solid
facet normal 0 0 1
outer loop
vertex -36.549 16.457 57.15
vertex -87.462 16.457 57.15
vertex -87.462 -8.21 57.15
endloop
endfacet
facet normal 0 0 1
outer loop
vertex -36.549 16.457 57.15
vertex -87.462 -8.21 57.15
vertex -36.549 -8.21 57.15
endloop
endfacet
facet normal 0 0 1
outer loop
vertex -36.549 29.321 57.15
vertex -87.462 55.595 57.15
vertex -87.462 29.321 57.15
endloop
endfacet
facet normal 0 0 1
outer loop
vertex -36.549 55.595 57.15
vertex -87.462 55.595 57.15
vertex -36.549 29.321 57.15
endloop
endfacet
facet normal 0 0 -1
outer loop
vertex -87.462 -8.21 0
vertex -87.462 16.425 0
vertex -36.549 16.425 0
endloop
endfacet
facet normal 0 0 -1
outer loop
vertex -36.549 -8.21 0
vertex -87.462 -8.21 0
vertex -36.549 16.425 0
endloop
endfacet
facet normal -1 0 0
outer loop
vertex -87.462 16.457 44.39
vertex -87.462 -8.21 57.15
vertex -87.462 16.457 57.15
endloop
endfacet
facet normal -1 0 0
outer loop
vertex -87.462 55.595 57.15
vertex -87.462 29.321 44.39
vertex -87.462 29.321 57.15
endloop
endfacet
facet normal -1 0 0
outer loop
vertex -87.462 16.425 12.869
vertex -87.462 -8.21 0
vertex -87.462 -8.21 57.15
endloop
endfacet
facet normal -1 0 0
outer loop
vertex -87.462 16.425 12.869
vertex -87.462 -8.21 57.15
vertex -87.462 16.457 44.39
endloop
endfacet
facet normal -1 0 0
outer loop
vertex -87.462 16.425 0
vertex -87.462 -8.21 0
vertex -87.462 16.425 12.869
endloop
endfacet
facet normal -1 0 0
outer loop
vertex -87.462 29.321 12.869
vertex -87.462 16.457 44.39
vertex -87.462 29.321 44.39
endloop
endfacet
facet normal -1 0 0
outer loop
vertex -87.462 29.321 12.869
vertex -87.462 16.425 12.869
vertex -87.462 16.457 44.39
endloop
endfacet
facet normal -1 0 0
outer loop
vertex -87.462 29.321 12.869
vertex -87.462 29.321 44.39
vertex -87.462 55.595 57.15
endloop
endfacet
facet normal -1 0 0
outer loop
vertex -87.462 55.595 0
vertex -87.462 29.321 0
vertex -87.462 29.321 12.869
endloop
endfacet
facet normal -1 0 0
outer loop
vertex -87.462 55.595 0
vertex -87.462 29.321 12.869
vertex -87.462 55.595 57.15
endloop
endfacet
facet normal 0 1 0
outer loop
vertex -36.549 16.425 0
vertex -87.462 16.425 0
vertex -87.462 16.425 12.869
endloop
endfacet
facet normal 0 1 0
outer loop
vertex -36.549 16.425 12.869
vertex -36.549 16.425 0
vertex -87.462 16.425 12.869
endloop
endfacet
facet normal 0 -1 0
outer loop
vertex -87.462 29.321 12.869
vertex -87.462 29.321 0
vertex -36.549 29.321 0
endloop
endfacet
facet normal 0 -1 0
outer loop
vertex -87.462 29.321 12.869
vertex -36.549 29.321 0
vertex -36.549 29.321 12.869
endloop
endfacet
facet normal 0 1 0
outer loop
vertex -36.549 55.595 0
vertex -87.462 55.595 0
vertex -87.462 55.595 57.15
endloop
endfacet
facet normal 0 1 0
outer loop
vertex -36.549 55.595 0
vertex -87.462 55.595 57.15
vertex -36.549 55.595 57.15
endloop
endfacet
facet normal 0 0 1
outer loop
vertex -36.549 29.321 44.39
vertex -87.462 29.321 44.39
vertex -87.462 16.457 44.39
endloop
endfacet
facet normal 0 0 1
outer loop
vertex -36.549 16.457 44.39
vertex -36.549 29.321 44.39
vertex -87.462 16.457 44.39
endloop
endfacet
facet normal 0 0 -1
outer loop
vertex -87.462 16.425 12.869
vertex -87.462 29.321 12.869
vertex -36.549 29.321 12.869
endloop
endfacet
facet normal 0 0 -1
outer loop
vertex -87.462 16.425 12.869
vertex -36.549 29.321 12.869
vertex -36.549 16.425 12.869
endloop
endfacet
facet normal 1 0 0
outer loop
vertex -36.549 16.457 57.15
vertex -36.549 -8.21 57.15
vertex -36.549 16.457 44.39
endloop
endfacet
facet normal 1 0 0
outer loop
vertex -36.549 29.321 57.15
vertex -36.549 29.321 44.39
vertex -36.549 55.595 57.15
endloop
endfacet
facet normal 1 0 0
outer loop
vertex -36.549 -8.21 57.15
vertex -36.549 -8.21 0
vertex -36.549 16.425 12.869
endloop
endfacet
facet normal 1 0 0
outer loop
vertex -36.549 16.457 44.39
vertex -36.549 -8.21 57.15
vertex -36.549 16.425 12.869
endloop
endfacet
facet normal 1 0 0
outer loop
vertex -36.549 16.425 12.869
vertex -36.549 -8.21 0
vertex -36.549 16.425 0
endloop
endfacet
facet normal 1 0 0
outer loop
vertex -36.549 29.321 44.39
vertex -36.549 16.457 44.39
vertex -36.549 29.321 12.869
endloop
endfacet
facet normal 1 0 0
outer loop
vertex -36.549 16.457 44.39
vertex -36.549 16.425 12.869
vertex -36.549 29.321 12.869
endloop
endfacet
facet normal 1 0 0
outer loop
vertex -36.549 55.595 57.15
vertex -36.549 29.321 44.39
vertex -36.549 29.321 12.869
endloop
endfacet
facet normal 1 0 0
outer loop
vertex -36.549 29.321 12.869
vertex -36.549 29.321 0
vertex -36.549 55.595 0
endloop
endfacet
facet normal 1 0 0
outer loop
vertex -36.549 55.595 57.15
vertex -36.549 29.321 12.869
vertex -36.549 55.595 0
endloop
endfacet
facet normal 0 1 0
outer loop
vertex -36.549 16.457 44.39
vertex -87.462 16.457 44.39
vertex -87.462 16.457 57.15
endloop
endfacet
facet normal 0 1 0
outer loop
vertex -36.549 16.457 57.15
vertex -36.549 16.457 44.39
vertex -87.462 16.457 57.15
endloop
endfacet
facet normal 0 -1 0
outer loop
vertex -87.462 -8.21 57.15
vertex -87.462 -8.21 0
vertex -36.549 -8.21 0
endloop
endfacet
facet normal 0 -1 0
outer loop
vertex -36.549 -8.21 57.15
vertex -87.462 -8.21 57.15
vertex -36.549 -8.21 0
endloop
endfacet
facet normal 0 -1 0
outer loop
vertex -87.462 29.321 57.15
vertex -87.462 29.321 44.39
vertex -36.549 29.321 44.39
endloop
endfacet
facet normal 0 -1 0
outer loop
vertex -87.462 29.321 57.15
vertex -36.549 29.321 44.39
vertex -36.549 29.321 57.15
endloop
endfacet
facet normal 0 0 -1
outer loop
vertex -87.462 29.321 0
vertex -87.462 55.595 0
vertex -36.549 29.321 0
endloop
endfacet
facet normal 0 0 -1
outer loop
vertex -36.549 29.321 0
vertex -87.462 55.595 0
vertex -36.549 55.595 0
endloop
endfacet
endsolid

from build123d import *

# Parameters (mm, degrees)
F0_W     = 50.9128235281
F0_H     = 63.8054171577
F1_DEPTH = 57.15
F2_W     = 12.8643363714
F2_H     = 12.7601113558
F3_DEPTH = 76.2
F4_W     = 12.8961652517
F4_H     = 12.868527323
F5_DEPTH = 76.2


with BuildPart() as f1:
    # F0 (on Top) → F1 (new body)
    with BuildSketch(Plane.XY):
        with Locations((-62.0051566511, 23.6927601509)):
            Rectangle(F0_W, F0_H)
    extrude(amount=F1_DEPTH)

    # F2 (on face) → F3 (cut)
    with BuildSketch(Plane(origin=(-87.4615684152, 0, 0), x_dir=(0, -1, 0), z_dir=(-1, 0, 0))):
        with Locations((-22.8889267892, 50.7699443221)):
            Rectangle(F2_W, F2_H)
    extrude(amount=-F3_DEPTH, mode=Mode.SUBTRACT)

    # F4 (on face) → F5 (cut)
    with BuildSketch(Plane(origin=(-87.4615684152, 0, 0), x_dir=(0, -1, 0), z_dir=(-1, 0, 0))):
        with Locations((-22.873012349, 6.4342636615)):
            Rectangle(F4_W, F4_H)
    extrude(amount=-F5_DEPTH, mode=Mode.SUBTRACT)


solid = f1.part
